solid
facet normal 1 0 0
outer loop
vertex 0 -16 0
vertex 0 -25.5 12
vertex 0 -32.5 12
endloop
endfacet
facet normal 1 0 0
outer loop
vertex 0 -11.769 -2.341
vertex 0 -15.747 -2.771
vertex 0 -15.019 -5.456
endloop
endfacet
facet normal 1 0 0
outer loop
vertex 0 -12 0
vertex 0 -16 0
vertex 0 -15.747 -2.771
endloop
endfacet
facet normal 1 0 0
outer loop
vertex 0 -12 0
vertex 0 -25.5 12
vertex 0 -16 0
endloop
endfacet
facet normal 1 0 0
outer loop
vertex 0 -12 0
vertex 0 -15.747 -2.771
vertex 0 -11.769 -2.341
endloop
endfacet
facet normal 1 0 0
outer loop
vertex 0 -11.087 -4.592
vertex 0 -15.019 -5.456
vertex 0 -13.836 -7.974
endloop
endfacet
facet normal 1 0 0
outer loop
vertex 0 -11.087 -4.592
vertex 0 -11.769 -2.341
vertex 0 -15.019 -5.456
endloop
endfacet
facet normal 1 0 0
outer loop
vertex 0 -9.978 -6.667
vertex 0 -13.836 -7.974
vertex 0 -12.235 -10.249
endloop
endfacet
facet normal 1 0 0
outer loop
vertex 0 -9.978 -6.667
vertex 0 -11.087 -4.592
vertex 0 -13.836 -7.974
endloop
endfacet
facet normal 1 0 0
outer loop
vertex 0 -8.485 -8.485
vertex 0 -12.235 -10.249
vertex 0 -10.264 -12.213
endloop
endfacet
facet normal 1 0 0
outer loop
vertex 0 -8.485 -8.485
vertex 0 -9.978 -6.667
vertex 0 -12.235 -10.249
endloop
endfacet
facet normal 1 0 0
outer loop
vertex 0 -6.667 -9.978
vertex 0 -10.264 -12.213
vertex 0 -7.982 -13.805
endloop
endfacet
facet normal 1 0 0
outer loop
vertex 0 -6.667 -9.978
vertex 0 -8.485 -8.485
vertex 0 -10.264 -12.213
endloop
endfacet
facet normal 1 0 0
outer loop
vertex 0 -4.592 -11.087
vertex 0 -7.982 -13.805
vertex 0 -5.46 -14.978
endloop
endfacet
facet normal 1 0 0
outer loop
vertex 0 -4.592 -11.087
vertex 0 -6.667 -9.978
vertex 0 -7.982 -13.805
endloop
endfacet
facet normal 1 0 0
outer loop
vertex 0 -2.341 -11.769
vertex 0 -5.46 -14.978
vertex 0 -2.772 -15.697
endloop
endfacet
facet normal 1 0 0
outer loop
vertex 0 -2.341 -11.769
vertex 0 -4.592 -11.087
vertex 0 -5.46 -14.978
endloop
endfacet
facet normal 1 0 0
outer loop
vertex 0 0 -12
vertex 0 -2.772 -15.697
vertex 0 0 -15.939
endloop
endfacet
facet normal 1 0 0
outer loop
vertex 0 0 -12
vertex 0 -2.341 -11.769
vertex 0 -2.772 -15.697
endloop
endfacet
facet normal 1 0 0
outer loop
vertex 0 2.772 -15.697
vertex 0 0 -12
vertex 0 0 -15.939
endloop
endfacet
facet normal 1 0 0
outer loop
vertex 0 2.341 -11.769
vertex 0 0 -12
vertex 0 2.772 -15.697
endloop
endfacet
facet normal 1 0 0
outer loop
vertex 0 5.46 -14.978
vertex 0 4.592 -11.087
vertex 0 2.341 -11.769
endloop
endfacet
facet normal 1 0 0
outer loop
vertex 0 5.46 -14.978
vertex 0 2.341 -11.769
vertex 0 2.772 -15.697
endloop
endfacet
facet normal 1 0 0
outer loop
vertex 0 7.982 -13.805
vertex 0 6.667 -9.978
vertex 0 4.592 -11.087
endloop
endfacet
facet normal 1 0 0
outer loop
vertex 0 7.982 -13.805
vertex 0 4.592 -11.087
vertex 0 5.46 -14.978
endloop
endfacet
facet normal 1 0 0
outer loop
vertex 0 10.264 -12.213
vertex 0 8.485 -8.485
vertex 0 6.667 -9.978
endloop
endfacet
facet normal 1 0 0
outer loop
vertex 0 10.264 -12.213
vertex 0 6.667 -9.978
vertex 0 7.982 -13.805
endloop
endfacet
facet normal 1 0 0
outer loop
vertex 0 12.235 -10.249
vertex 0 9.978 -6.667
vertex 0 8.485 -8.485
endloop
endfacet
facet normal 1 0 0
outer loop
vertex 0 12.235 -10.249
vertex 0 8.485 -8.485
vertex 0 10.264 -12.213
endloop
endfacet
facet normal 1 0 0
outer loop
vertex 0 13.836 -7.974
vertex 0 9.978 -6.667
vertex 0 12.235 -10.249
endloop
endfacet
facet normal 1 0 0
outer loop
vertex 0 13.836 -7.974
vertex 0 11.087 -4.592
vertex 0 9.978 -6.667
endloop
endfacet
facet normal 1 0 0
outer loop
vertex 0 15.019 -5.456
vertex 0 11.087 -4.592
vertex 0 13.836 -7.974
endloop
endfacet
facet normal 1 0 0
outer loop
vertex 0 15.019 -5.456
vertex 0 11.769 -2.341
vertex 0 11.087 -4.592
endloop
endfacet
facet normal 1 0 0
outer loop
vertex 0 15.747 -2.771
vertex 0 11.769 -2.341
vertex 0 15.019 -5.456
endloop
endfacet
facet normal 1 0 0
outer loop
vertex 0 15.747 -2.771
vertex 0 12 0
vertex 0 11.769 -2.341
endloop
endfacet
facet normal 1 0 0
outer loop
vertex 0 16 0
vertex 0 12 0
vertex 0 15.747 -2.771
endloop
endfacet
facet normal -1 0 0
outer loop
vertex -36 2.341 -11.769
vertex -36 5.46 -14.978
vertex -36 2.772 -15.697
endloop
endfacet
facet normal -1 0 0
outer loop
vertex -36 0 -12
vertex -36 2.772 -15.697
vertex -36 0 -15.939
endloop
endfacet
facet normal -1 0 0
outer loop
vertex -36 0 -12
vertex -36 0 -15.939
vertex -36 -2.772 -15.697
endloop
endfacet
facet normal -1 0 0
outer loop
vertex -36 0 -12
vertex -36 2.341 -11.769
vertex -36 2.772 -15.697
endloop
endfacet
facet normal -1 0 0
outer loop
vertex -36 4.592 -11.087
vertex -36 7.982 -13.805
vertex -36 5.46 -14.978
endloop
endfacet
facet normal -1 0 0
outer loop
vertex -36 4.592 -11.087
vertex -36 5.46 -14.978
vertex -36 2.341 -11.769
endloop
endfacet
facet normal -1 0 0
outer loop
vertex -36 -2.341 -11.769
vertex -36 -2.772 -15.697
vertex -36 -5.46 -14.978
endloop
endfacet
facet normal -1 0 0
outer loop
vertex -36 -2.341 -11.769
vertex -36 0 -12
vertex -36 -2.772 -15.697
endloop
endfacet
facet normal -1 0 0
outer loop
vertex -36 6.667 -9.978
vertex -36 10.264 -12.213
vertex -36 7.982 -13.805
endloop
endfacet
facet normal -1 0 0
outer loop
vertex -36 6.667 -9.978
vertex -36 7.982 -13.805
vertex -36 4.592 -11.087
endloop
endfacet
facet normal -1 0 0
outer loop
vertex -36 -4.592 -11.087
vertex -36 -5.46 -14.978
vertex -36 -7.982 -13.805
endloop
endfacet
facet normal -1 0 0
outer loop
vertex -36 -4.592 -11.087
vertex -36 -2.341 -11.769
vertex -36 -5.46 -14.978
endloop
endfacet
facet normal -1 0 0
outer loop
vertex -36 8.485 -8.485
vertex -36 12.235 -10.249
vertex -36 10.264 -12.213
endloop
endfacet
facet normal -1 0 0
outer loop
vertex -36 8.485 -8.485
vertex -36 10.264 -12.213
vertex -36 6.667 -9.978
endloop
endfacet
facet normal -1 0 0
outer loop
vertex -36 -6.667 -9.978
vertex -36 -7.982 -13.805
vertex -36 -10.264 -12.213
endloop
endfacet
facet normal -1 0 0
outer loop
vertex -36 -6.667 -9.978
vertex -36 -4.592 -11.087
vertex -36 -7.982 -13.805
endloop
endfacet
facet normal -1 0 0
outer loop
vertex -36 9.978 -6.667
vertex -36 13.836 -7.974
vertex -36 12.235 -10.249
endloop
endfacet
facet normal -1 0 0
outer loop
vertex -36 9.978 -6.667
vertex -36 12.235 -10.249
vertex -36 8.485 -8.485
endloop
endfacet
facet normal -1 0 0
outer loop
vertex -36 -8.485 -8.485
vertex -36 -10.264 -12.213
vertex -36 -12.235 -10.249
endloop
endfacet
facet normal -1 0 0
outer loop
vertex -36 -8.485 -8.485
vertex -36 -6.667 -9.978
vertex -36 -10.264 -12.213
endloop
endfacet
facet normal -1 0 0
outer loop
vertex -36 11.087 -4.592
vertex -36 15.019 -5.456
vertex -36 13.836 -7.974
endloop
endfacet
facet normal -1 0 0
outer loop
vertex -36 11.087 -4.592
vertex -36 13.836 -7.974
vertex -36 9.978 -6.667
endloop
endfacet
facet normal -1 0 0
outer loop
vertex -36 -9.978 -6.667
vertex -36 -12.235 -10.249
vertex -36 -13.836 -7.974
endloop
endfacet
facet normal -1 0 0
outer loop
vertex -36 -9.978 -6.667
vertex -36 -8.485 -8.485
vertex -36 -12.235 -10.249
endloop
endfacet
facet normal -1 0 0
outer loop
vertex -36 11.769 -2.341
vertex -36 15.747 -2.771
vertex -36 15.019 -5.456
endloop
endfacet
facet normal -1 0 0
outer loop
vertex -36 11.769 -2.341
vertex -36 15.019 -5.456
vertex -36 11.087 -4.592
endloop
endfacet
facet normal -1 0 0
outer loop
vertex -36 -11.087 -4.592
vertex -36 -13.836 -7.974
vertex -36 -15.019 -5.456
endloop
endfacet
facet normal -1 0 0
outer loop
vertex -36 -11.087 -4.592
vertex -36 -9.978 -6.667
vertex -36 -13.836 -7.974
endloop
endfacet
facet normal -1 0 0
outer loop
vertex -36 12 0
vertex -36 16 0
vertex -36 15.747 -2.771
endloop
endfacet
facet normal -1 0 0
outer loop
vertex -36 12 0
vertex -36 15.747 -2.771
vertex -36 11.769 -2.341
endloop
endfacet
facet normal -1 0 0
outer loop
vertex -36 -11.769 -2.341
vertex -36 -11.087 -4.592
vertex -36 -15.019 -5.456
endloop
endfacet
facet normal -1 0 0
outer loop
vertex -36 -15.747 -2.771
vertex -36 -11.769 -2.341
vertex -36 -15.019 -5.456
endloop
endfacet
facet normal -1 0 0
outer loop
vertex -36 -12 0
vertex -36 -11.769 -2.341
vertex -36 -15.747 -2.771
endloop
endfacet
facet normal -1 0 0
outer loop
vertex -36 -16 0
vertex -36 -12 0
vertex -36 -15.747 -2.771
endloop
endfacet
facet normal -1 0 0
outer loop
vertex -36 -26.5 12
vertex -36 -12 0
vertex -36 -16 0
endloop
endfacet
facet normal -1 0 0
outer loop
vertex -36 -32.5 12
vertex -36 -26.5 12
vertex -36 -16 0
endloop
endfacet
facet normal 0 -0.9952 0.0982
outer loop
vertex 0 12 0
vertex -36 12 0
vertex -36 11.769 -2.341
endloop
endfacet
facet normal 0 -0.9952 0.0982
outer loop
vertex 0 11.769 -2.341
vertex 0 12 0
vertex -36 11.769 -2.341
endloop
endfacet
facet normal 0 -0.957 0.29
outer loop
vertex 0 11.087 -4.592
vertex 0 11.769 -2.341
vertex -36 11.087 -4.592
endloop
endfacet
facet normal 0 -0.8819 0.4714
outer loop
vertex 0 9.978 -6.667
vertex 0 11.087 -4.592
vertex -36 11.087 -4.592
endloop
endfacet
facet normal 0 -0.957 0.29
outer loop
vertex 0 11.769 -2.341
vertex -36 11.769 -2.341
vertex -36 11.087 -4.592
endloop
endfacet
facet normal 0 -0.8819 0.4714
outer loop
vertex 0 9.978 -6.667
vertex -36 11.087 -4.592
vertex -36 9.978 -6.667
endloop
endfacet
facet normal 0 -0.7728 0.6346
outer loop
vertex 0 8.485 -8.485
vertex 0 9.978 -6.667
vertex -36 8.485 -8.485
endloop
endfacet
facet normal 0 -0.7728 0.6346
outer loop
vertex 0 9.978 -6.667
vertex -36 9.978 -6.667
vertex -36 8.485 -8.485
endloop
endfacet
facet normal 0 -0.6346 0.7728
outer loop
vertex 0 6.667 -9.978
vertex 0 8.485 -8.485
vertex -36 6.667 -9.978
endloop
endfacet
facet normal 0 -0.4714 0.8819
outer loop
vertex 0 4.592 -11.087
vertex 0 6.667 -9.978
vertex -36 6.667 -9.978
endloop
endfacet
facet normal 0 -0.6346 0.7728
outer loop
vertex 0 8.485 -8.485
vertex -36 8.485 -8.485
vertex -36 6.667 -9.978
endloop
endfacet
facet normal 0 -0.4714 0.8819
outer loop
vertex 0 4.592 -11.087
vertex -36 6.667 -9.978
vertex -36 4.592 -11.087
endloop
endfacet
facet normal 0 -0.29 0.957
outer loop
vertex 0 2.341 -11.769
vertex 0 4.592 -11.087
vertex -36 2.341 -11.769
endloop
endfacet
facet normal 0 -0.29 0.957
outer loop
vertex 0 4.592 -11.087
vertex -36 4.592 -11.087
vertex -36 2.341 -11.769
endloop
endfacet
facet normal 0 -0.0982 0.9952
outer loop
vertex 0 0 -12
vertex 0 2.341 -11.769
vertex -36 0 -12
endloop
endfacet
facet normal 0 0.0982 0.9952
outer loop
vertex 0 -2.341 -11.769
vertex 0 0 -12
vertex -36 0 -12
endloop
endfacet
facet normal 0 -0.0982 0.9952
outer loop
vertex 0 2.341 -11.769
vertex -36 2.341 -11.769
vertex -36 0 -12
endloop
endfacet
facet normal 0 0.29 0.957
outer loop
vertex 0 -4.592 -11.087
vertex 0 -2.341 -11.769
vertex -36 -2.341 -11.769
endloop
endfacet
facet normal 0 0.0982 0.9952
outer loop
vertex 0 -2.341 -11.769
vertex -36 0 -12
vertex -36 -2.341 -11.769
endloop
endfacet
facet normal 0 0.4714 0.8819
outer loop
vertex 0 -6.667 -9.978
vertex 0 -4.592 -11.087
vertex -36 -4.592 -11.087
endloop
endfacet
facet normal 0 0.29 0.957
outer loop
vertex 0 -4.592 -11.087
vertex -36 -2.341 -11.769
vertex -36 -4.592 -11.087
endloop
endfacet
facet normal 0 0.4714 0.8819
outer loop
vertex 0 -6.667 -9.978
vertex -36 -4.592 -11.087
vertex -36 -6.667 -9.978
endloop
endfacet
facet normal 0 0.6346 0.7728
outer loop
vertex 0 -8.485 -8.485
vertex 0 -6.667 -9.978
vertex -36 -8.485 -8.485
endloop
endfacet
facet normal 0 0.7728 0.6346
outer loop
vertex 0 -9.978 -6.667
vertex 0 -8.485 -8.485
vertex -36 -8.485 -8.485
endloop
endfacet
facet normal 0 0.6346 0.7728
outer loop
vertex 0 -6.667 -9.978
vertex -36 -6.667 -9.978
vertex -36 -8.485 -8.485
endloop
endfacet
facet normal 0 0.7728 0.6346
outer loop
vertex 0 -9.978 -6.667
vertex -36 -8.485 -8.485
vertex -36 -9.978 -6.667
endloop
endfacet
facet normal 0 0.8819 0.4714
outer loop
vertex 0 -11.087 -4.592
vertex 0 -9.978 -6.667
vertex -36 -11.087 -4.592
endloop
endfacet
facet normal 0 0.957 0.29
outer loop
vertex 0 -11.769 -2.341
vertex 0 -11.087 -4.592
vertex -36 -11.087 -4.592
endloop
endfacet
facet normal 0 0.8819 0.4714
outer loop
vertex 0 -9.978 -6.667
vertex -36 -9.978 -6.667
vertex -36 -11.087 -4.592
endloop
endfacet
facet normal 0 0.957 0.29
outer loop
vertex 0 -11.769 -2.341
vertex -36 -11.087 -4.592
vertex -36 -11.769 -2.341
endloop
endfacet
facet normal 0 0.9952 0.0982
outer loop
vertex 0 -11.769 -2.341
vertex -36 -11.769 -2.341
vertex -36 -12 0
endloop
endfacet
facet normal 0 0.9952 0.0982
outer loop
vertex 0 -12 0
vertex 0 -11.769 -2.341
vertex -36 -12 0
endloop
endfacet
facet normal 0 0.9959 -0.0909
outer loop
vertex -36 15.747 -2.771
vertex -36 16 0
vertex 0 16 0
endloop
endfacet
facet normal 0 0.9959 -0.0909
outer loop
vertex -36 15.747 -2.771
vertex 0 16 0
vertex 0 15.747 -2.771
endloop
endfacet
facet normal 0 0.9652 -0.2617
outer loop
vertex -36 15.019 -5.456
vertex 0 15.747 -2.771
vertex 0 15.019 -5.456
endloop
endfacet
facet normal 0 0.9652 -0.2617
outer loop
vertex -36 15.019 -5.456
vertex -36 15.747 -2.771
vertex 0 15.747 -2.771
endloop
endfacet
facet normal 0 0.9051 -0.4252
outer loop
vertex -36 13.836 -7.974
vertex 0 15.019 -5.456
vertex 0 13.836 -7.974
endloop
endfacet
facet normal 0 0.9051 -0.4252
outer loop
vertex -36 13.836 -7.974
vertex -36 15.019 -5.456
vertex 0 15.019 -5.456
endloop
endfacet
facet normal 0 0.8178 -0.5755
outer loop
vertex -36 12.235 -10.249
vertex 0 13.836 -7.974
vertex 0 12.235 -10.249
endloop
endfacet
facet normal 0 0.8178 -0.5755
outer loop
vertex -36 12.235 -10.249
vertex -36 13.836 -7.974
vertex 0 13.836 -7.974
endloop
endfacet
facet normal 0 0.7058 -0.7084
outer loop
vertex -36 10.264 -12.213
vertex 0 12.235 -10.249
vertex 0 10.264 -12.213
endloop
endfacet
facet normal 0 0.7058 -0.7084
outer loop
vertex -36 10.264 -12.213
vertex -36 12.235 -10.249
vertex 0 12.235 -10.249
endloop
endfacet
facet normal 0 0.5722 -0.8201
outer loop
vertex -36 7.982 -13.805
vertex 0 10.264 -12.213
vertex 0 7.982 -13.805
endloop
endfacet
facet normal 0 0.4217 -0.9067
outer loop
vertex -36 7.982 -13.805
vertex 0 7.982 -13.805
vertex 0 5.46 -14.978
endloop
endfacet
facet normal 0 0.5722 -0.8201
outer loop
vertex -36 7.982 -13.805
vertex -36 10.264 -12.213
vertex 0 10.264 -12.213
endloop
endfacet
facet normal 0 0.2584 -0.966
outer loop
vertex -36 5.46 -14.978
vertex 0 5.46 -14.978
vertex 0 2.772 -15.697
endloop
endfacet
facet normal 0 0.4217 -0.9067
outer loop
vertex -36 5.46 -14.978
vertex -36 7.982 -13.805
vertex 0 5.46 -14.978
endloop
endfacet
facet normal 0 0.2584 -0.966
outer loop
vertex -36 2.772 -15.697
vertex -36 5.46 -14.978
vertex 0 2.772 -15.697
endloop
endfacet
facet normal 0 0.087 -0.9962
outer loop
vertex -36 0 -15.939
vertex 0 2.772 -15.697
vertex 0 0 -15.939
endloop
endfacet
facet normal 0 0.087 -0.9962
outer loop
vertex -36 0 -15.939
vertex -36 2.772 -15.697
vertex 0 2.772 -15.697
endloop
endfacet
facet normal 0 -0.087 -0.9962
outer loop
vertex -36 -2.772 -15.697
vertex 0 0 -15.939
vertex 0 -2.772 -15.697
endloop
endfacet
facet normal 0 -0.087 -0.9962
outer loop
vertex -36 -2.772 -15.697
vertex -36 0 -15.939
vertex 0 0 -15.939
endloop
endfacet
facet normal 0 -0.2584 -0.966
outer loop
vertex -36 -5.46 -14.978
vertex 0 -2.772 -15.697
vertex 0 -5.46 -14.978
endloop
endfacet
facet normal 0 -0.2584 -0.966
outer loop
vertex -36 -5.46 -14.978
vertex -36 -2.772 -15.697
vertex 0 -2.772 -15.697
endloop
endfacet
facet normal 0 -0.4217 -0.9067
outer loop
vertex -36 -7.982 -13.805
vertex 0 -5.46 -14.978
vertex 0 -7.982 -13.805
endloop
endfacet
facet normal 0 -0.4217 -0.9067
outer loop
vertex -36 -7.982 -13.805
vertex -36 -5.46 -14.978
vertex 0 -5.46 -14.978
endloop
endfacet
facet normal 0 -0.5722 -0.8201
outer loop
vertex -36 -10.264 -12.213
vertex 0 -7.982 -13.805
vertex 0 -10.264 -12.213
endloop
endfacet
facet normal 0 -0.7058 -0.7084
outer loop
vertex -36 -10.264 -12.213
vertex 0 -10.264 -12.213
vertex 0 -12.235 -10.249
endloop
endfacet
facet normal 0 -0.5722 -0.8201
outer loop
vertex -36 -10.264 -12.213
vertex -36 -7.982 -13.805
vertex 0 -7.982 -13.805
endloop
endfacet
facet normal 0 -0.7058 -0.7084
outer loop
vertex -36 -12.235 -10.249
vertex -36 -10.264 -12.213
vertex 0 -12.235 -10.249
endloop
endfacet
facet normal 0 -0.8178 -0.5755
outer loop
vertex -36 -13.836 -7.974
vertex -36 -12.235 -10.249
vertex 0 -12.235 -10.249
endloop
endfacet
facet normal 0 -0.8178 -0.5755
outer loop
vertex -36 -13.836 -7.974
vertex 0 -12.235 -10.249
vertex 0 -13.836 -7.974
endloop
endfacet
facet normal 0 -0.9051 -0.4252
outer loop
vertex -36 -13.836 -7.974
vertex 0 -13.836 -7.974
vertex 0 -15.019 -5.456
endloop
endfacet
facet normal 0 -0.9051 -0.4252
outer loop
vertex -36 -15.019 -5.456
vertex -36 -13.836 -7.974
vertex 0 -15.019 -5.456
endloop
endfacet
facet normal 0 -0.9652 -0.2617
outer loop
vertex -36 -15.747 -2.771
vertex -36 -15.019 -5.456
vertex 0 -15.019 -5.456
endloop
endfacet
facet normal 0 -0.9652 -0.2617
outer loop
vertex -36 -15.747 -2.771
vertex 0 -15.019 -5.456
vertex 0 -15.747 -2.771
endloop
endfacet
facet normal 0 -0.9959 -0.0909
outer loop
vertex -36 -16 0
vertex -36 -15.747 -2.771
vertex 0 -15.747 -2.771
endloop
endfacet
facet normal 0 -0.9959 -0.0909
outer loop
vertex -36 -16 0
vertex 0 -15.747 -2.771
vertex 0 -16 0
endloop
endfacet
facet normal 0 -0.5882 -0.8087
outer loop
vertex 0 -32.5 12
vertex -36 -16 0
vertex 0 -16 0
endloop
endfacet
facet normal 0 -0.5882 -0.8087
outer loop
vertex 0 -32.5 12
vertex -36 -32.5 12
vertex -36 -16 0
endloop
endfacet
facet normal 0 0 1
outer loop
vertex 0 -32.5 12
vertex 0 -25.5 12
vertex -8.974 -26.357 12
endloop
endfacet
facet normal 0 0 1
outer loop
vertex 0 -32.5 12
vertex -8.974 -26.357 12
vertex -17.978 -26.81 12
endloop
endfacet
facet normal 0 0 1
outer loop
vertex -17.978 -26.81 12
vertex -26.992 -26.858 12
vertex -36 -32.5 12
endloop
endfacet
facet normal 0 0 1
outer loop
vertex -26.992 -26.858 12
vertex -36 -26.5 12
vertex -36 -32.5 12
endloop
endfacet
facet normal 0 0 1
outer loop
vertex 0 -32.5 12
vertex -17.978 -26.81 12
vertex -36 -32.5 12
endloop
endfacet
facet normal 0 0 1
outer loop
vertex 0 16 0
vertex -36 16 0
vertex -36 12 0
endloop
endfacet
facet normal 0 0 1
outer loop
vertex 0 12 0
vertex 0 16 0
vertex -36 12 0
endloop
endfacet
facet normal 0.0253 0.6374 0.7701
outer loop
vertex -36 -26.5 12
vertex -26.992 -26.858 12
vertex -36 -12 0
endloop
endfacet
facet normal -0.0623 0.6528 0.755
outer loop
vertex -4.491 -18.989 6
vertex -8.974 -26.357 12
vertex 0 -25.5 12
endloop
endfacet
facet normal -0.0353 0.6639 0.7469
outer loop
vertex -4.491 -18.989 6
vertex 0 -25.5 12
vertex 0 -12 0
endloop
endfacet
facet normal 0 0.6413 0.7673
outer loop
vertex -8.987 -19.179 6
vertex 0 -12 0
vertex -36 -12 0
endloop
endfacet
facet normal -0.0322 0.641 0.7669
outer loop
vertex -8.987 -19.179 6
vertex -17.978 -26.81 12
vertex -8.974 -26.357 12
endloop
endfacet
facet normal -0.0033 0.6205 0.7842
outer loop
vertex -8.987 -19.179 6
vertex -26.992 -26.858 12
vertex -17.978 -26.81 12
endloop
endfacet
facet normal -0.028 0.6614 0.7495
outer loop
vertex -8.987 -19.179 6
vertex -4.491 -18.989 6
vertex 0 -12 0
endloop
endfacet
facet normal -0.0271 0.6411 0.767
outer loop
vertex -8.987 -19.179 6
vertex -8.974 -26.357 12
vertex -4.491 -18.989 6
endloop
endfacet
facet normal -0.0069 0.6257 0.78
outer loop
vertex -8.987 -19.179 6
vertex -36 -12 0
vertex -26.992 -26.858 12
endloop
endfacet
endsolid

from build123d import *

# Parameters (mm, degrees)
F2_FACE_W = 36
F2_FACE_H = 4


with BuildPart() as f2:
    # F2: sweep along a path in F1
    with BuildLine(Plane.XY) as f2_path:
        Line((0, 0), (-36, 0))
    # F0 (on Right) → F2 (sweep)
    with BuildSketch(Plane.YZ):
        with BuildLine():
            ThreePointArc((12, 0), (0, -12), (-12, 0))
            Line((-12, 0), (-16, 0))
            ThreePointArc((-16, 0), (0, -15.9386387537), (16, 0))
            Line((16, 0), (12, 0))
        make_face()
    sweep(path=f2_path.line)

    # F2_face (on face) → F5 section 0
    with BuildSketch(Plane(origin=(-18, -14, 0), x_dir=(1, 0, 0), z_dir=(0, 0, 1))):
        Rectangle(F2_FACE_W, F2_FACE_H)
    # F4 (on offset) → F5 section 1
    with BuildSketch(Plane.XY.offset(12)):
        with BuildLine():
            ThreePointArc((0, -25.5), (-17.9775042284, -26.8098477779), (-36, -26.5))
            Line((-36, -26.5), (-36, -32.5))
            Line((-36, -32.5), (0, -32.5))
            Line((0, -32.5), (0, -25.5))
        make_face()
    loft()


solid = f2.part
